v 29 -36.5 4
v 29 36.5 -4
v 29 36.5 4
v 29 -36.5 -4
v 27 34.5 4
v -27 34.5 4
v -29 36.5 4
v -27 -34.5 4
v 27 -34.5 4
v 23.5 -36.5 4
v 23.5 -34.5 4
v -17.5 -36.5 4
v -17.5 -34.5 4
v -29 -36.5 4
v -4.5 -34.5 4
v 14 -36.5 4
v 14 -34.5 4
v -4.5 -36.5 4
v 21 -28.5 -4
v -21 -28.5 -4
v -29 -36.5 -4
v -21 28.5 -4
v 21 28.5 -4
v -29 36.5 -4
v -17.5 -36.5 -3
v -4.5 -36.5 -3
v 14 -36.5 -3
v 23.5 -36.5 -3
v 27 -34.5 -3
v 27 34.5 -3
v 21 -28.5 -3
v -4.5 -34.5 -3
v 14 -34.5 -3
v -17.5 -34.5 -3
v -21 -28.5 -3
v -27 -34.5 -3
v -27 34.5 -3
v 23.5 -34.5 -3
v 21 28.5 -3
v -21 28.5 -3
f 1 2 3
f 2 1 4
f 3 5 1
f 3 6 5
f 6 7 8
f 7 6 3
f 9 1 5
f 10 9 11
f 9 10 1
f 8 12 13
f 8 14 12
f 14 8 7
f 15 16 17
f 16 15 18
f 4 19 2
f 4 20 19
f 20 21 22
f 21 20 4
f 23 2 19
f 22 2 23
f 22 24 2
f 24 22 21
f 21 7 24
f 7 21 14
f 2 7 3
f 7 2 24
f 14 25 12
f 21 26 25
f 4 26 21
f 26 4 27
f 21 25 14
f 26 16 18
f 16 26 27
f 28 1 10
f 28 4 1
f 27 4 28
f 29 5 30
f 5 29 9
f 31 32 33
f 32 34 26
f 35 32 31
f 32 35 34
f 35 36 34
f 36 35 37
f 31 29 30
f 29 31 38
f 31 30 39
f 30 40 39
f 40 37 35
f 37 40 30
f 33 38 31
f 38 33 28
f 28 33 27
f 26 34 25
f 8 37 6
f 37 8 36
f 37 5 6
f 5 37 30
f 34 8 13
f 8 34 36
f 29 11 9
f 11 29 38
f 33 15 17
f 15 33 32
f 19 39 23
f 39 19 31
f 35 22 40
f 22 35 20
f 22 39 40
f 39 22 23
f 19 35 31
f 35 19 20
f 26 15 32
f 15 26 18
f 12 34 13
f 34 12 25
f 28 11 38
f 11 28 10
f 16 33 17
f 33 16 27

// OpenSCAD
arduino_width = 54;
arduino_length = 69;
arduino_usb_width = 13;
arduino_usb_height = 15;
arduino_usb_x = 9.5;
arduino_power_width = 9.5;
arduino_power_height = 15;
arduino_power_x = 3.5;

wall_thickness = 2;
wall_height = 7;
bottom_thickness = 1;
side_shoulder = 6;

difference()
{
	// Exterior box
	cube([arduino_width+(2*wall_thickness),arduino_length+(2*wall_thickness),wall_height+bottom_thickness], center=true);

	// Interior recess
	translate([0,0,bottom_thickness/2.0])
		cube([arduino_width,arduino_length,wall_height], center=true);

	// Bottom hole
	cube([arduino_width-(2*side_shoulder),arduino_length-(2*side_shoulder),wall_height+bottom_thickness], center=true);

	// USB hole
	translate([	-1*((arduino_width/2.0)-(arduino_usb_width/2.0)-arduino_usb_x),
			-1*(arduino_length/2.0)-(wall_thickness/2.0),
			-1*(wall_height/2.0 - arduino_usb_height/2.0)+bottom_thickness/2.0])
	{
		cube([arduino_usb_width,wall_thickness,arduino_usb_height], center=true);
	}

	// Power hole
	translate([	((arduino_width/2.0)-(arduino_power_width/2.0)-arduino_power_x),
			-1*(arduino_length/2.0)-(wall_thickness/2.0),
			-1*(wall_height/2.0 - arduino_power_height/2.0)+bottom_thickness/2.0])
	{
		cube([arduino_power_width,wall_thickness,arduino_power_height], center=true);
	}
	
}
